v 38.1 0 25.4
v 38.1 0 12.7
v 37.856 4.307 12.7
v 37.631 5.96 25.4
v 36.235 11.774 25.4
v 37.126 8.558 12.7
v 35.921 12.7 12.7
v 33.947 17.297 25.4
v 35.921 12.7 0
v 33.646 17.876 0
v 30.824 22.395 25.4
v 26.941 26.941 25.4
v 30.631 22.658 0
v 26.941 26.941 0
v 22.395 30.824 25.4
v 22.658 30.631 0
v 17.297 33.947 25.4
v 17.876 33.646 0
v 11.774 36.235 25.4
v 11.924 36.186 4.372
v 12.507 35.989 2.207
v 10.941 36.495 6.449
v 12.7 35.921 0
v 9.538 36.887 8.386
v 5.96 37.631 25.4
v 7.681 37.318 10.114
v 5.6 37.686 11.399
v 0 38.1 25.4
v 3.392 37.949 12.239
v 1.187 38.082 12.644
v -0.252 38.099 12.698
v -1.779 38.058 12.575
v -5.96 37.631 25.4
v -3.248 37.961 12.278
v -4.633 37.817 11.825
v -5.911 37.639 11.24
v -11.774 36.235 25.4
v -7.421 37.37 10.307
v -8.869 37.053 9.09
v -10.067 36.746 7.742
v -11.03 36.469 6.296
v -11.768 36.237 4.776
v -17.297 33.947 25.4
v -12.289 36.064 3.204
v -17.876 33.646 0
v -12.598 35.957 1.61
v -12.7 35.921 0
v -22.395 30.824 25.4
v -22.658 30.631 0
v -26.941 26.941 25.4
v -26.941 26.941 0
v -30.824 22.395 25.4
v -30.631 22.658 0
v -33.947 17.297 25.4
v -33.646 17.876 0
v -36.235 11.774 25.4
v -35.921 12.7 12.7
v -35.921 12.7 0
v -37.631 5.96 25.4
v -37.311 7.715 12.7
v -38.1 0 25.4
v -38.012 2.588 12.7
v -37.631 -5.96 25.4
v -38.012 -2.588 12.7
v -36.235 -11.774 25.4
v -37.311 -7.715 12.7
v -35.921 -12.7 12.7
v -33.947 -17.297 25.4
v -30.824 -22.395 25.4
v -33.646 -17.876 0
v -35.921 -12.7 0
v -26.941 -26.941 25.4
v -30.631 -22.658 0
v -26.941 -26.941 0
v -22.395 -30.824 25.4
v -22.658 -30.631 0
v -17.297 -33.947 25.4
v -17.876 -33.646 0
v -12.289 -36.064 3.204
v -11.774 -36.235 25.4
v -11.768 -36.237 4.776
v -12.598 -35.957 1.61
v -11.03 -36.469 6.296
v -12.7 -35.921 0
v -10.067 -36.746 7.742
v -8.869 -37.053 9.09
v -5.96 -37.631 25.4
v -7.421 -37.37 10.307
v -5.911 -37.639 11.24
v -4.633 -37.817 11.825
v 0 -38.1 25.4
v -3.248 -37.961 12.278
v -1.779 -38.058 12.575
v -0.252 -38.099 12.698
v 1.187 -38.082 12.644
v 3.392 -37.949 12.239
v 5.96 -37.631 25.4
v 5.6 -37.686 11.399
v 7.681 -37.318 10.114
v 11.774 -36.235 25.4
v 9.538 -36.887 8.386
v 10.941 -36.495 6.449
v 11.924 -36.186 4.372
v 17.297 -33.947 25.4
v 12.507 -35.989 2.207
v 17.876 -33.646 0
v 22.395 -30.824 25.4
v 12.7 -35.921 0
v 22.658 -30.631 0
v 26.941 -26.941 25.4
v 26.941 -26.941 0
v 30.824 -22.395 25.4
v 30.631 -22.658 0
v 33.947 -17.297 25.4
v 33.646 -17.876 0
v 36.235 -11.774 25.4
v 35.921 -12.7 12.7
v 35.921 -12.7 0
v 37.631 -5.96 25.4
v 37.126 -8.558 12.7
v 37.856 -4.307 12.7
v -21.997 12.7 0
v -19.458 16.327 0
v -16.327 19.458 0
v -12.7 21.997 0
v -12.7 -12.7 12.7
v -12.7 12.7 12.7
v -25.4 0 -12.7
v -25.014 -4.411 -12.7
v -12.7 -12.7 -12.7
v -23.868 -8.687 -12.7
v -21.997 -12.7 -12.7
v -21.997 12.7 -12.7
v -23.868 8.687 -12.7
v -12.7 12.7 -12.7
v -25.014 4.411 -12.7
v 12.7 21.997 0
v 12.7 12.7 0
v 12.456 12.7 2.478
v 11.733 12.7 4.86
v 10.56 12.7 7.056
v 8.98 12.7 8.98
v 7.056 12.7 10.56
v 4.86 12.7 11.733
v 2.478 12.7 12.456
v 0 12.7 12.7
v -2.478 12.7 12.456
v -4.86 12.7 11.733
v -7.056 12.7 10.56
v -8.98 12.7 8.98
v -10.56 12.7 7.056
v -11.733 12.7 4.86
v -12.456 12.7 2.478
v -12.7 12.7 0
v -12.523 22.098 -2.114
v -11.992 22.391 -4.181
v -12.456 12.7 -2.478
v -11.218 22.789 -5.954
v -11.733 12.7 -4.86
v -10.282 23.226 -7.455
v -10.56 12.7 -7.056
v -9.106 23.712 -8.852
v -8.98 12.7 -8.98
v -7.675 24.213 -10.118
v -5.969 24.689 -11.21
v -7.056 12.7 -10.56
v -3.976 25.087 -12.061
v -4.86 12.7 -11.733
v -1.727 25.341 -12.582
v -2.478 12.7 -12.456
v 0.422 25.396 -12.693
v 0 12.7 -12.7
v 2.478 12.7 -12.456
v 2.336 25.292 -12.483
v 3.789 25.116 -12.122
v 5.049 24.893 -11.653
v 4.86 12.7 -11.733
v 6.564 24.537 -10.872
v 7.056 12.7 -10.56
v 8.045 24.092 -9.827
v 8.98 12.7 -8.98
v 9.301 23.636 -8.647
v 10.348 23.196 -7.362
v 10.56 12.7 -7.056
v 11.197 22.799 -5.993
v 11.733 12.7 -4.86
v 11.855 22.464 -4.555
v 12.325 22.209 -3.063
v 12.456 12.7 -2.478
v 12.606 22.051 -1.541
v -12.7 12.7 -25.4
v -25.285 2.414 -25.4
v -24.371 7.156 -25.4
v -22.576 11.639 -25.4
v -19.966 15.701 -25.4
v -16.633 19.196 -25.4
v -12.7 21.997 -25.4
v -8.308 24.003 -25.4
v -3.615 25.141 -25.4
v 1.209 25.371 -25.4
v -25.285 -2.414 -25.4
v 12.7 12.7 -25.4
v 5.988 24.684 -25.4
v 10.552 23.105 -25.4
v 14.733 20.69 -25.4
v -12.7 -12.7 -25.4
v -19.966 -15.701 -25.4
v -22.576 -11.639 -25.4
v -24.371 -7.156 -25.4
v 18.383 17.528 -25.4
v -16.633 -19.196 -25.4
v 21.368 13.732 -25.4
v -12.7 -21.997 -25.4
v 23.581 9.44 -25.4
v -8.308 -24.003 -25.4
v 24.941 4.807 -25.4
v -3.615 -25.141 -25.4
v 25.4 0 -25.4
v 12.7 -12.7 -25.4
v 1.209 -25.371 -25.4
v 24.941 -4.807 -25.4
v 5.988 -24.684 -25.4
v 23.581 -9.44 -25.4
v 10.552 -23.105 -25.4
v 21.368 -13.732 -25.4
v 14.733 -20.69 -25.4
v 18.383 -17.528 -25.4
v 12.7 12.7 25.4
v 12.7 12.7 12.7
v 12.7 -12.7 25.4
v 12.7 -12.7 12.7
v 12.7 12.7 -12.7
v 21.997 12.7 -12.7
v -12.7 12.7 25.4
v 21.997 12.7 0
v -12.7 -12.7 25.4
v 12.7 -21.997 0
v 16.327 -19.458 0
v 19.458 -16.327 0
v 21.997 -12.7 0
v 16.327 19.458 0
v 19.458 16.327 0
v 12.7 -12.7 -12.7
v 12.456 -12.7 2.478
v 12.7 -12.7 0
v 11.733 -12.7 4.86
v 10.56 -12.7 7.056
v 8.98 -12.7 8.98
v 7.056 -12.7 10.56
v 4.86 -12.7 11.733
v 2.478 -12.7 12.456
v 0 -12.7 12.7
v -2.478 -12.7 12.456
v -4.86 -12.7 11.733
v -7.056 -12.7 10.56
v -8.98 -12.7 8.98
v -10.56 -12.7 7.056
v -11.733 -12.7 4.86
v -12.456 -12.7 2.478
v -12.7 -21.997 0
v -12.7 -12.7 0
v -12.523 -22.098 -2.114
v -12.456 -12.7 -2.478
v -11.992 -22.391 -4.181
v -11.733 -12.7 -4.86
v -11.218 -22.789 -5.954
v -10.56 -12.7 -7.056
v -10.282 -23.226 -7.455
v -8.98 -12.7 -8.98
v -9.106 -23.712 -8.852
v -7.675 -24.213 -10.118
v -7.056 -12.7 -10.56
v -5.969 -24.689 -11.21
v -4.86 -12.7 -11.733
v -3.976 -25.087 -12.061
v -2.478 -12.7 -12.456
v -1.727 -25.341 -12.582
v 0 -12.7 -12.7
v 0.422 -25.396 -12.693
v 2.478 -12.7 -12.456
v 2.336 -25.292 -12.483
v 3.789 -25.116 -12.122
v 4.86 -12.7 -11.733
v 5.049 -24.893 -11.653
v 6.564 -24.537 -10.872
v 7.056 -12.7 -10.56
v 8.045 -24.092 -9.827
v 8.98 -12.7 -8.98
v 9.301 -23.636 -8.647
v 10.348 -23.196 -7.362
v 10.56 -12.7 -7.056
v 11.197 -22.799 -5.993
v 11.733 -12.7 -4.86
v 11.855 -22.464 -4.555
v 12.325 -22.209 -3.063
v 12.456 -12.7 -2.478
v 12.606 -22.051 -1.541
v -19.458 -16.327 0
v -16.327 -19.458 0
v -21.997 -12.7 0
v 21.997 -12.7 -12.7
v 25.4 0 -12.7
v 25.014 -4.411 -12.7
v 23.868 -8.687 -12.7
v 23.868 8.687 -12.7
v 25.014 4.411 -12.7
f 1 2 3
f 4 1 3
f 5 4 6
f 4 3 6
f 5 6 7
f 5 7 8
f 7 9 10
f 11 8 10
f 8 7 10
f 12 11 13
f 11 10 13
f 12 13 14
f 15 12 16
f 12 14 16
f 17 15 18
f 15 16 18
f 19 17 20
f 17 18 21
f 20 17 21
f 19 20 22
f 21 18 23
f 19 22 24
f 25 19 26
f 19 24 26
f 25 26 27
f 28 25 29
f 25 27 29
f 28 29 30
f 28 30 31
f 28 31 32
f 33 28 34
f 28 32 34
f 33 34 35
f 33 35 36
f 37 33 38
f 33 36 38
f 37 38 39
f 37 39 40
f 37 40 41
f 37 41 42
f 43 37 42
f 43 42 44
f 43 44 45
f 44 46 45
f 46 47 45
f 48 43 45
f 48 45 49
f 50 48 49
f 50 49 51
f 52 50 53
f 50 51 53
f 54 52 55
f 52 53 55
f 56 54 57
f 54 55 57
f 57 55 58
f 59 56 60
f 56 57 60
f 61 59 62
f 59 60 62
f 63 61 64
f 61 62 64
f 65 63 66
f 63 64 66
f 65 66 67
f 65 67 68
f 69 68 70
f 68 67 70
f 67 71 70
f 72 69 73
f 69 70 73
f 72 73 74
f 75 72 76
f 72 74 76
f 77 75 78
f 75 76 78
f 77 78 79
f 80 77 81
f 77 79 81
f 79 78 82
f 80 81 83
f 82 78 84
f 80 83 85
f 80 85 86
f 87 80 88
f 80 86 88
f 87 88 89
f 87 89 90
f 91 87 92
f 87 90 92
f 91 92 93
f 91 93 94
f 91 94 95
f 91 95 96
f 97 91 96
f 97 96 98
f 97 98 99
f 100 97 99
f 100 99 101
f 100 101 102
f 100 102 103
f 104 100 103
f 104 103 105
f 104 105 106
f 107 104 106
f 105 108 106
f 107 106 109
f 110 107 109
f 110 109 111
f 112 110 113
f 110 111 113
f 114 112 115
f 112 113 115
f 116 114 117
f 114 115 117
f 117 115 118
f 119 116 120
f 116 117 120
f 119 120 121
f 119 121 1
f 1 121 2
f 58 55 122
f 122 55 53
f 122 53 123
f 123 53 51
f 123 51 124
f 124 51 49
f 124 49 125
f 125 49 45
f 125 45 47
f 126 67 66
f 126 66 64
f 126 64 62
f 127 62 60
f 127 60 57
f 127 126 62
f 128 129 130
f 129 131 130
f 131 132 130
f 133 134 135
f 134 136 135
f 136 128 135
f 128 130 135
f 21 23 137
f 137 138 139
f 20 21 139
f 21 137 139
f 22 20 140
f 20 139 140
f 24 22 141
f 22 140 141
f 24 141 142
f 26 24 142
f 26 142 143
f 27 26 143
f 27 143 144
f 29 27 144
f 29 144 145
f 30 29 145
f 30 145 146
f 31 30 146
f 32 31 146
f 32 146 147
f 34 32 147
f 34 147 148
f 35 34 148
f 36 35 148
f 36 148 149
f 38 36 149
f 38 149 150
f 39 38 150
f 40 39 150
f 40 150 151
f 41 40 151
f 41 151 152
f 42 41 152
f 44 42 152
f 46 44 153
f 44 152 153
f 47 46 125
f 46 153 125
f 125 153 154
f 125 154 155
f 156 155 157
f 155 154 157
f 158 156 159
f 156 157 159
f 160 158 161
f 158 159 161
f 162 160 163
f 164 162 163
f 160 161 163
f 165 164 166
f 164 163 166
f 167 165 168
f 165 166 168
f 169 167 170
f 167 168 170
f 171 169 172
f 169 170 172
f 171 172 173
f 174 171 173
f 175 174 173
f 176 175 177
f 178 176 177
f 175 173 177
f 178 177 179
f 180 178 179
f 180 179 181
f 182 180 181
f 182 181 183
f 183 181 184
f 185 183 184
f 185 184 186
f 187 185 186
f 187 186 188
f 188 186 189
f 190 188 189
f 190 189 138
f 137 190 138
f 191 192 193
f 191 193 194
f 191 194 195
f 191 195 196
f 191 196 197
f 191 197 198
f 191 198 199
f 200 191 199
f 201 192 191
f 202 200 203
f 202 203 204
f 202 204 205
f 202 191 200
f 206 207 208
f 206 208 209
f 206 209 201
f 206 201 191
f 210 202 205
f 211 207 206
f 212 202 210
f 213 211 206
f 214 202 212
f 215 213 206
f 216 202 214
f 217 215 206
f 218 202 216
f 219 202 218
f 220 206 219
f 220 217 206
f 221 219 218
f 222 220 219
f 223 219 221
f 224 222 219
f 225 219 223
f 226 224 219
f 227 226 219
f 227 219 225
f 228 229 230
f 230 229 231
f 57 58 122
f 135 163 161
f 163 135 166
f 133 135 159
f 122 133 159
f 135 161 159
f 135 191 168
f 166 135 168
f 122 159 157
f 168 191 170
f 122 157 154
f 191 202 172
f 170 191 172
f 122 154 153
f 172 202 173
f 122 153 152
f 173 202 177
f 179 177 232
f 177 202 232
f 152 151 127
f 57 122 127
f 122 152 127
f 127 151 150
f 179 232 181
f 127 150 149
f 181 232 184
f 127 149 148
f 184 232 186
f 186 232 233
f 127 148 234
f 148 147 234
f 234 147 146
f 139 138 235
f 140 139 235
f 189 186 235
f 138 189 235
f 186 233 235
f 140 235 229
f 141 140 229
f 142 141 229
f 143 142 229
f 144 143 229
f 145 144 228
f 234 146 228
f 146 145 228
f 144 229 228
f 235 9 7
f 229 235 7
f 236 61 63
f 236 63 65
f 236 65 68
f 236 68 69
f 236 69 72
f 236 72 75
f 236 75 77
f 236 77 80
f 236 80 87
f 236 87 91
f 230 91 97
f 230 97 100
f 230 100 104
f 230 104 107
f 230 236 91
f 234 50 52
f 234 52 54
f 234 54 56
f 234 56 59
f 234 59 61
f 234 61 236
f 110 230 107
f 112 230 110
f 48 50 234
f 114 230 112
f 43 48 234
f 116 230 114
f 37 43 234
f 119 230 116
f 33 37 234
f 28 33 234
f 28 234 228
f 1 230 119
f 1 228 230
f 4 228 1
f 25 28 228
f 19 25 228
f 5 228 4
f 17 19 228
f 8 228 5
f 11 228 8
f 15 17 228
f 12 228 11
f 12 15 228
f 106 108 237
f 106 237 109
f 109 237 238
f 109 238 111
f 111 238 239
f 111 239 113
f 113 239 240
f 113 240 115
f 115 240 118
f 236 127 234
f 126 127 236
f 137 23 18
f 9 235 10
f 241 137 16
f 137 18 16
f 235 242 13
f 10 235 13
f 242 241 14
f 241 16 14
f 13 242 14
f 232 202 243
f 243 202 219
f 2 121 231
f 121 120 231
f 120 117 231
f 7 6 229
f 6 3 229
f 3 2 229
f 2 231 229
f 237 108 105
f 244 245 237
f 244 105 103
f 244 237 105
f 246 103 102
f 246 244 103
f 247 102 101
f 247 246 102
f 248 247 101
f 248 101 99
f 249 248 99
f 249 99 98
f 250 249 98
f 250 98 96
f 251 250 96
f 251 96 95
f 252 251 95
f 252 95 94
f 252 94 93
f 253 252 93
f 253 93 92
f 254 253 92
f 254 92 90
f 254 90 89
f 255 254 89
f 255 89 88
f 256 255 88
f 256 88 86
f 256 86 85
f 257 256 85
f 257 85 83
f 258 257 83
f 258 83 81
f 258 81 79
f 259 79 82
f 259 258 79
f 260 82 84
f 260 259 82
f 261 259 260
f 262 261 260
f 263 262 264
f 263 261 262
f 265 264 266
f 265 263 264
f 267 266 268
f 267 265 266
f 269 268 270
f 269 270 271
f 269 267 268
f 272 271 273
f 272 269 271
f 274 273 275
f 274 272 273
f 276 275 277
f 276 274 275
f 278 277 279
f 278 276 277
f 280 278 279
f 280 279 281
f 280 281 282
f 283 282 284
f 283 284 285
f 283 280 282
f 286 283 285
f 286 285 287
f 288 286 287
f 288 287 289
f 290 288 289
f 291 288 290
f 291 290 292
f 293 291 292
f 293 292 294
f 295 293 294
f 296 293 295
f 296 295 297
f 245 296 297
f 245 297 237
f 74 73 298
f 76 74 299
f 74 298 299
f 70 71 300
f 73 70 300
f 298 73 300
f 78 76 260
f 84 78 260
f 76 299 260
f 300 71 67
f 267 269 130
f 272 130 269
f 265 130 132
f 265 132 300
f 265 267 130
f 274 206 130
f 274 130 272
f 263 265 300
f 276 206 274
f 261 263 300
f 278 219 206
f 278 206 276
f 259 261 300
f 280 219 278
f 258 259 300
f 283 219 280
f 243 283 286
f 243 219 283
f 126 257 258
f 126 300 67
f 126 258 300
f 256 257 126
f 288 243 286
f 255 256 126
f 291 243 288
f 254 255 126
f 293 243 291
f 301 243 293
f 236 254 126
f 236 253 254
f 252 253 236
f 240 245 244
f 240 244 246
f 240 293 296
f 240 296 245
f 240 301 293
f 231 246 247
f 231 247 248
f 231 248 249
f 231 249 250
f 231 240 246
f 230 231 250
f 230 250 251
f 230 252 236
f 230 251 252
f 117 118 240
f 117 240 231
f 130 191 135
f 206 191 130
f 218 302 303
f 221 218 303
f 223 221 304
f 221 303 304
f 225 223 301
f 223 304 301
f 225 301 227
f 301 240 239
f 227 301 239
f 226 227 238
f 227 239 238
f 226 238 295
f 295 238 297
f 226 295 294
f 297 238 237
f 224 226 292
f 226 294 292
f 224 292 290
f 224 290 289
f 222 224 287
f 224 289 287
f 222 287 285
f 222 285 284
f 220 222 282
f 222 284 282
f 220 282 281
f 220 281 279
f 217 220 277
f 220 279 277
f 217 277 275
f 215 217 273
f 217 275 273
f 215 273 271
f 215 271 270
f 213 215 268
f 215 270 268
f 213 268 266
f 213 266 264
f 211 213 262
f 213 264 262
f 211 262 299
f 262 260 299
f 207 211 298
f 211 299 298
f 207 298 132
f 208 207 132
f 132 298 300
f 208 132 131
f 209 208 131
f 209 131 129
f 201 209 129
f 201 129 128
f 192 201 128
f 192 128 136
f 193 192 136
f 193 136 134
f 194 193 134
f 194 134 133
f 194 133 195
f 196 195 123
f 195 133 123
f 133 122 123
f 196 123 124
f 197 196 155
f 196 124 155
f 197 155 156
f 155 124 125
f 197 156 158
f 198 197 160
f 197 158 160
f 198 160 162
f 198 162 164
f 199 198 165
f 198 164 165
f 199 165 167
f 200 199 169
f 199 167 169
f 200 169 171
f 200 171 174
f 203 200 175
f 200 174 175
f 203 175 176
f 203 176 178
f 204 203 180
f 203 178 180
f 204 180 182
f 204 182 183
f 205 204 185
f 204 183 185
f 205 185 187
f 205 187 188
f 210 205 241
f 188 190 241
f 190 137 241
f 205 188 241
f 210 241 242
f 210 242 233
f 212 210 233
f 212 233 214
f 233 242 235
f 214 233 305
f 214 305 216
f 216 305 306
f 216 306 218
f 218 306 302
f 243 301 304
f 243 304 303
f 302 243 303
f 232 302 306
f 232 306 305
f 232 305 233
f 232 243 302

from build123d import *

# Parameters (mm, degrees)
F0_R      = 38.1
F1_DEPTH  = 25.4
F2_W      = 25.4
F2_H      = 25.4
F3_DEPTH  = 25.4
F4_R      = 25.4
F5_DEPTH  = 25.4
F6_W      = 25.4
F6_H      = 25.4
F7_DEPTH  = 166
F8_W      = 25.4
F8_H      = 25.4
F9_DEPTH  = 76.201
F10_R     = 12.7
F11_DEPTH = 38.101
F12_DEPTH = 50.8
F13_W     = 25.4
F13_H     = 25.4
F14_DEPTH = 38.1010001
F15_W     = 25.4
F15_H     = 25.4
F16_DEPTH = 50.8010001


# Not quite as in the source:
# - an extrude ends at something that could not be found from the text; its depth is read off the source's solid


with BuildPart() as f1:
    # F0 (on Top) → F1 (new body)
    with BuildSketch(Plane.XY):
        Circle(F0_R)
    extrude(amount=F1_DEPTH)

    # F2 (on face) → F3 (join)
    with BuildSketch(Plane.XY.offset(25.4)):
        Rectangle(F2_W, F2_H)
    extrude(amount=F3_DEPTH)

    # F4 (on face) → F5 (join)
    with BuildSketch(Plane(origin=(0, 0, 0), x_dir=(1, 0, 0), z_dir=(0, 0, -1))):
        Circle(F4_R)
    extrude(amount=F5_DEPTH)

    # F6 (on face) → F7 (cut, through all)
    with BuildSketch(Plane(origin=(0, 0, -25.4), x_dir=(1, 0, 0), z_dir=(0, 0, -1))):
        Rectangle(F6_W, F6_H)
    extrude(amount=F7_DEPTH, mode=Mode.SUBTRACT)

    # F8 (on face) → F9 (cut, through all)
    with BuildSketch(Plane(origin=(0, 0, -25.4), x_dir=(1, 0, 0), z_dir=(0, 0, -1))):
        Rectangle(F8_W, F8_H)
    extrude(amount=-F9_DEPTH, mode=Mode.SUBTRACT)

    # F10 (on Front) → F11 (cut, through all)
    with BuildSketch(Plane.XZ):
        Circle(F10_R)
    extrude(amount=-F11_DEPTH, mode=Mode.SUBTRACT)

    # F10 (on Front) → F12 (cut)
    with BuildSketch(Plane.XZ):
        Circle(F10_R)
    extrude(amount=F12_DEPTH, mode=Mode.SUBTRACT)

    # F13 (on Right) → F14 (cut, through all)
    with BuildSketch(Plane.YZ):
        Rectangle(F13_W, F13_H)
    extrude(amount=-F14_DEPTH, mode=Mode.SUBTRACT)

    # F15 (on face) → F16 (cut, through all)
    with BuildSketch(Plane.YZ.offset(-12.7)):
        Rectangle(F15_W, F15_H)
    extrude(amount=F16_DEPTH, mode=Mode.SUBTRACT)


solid = f1.part
